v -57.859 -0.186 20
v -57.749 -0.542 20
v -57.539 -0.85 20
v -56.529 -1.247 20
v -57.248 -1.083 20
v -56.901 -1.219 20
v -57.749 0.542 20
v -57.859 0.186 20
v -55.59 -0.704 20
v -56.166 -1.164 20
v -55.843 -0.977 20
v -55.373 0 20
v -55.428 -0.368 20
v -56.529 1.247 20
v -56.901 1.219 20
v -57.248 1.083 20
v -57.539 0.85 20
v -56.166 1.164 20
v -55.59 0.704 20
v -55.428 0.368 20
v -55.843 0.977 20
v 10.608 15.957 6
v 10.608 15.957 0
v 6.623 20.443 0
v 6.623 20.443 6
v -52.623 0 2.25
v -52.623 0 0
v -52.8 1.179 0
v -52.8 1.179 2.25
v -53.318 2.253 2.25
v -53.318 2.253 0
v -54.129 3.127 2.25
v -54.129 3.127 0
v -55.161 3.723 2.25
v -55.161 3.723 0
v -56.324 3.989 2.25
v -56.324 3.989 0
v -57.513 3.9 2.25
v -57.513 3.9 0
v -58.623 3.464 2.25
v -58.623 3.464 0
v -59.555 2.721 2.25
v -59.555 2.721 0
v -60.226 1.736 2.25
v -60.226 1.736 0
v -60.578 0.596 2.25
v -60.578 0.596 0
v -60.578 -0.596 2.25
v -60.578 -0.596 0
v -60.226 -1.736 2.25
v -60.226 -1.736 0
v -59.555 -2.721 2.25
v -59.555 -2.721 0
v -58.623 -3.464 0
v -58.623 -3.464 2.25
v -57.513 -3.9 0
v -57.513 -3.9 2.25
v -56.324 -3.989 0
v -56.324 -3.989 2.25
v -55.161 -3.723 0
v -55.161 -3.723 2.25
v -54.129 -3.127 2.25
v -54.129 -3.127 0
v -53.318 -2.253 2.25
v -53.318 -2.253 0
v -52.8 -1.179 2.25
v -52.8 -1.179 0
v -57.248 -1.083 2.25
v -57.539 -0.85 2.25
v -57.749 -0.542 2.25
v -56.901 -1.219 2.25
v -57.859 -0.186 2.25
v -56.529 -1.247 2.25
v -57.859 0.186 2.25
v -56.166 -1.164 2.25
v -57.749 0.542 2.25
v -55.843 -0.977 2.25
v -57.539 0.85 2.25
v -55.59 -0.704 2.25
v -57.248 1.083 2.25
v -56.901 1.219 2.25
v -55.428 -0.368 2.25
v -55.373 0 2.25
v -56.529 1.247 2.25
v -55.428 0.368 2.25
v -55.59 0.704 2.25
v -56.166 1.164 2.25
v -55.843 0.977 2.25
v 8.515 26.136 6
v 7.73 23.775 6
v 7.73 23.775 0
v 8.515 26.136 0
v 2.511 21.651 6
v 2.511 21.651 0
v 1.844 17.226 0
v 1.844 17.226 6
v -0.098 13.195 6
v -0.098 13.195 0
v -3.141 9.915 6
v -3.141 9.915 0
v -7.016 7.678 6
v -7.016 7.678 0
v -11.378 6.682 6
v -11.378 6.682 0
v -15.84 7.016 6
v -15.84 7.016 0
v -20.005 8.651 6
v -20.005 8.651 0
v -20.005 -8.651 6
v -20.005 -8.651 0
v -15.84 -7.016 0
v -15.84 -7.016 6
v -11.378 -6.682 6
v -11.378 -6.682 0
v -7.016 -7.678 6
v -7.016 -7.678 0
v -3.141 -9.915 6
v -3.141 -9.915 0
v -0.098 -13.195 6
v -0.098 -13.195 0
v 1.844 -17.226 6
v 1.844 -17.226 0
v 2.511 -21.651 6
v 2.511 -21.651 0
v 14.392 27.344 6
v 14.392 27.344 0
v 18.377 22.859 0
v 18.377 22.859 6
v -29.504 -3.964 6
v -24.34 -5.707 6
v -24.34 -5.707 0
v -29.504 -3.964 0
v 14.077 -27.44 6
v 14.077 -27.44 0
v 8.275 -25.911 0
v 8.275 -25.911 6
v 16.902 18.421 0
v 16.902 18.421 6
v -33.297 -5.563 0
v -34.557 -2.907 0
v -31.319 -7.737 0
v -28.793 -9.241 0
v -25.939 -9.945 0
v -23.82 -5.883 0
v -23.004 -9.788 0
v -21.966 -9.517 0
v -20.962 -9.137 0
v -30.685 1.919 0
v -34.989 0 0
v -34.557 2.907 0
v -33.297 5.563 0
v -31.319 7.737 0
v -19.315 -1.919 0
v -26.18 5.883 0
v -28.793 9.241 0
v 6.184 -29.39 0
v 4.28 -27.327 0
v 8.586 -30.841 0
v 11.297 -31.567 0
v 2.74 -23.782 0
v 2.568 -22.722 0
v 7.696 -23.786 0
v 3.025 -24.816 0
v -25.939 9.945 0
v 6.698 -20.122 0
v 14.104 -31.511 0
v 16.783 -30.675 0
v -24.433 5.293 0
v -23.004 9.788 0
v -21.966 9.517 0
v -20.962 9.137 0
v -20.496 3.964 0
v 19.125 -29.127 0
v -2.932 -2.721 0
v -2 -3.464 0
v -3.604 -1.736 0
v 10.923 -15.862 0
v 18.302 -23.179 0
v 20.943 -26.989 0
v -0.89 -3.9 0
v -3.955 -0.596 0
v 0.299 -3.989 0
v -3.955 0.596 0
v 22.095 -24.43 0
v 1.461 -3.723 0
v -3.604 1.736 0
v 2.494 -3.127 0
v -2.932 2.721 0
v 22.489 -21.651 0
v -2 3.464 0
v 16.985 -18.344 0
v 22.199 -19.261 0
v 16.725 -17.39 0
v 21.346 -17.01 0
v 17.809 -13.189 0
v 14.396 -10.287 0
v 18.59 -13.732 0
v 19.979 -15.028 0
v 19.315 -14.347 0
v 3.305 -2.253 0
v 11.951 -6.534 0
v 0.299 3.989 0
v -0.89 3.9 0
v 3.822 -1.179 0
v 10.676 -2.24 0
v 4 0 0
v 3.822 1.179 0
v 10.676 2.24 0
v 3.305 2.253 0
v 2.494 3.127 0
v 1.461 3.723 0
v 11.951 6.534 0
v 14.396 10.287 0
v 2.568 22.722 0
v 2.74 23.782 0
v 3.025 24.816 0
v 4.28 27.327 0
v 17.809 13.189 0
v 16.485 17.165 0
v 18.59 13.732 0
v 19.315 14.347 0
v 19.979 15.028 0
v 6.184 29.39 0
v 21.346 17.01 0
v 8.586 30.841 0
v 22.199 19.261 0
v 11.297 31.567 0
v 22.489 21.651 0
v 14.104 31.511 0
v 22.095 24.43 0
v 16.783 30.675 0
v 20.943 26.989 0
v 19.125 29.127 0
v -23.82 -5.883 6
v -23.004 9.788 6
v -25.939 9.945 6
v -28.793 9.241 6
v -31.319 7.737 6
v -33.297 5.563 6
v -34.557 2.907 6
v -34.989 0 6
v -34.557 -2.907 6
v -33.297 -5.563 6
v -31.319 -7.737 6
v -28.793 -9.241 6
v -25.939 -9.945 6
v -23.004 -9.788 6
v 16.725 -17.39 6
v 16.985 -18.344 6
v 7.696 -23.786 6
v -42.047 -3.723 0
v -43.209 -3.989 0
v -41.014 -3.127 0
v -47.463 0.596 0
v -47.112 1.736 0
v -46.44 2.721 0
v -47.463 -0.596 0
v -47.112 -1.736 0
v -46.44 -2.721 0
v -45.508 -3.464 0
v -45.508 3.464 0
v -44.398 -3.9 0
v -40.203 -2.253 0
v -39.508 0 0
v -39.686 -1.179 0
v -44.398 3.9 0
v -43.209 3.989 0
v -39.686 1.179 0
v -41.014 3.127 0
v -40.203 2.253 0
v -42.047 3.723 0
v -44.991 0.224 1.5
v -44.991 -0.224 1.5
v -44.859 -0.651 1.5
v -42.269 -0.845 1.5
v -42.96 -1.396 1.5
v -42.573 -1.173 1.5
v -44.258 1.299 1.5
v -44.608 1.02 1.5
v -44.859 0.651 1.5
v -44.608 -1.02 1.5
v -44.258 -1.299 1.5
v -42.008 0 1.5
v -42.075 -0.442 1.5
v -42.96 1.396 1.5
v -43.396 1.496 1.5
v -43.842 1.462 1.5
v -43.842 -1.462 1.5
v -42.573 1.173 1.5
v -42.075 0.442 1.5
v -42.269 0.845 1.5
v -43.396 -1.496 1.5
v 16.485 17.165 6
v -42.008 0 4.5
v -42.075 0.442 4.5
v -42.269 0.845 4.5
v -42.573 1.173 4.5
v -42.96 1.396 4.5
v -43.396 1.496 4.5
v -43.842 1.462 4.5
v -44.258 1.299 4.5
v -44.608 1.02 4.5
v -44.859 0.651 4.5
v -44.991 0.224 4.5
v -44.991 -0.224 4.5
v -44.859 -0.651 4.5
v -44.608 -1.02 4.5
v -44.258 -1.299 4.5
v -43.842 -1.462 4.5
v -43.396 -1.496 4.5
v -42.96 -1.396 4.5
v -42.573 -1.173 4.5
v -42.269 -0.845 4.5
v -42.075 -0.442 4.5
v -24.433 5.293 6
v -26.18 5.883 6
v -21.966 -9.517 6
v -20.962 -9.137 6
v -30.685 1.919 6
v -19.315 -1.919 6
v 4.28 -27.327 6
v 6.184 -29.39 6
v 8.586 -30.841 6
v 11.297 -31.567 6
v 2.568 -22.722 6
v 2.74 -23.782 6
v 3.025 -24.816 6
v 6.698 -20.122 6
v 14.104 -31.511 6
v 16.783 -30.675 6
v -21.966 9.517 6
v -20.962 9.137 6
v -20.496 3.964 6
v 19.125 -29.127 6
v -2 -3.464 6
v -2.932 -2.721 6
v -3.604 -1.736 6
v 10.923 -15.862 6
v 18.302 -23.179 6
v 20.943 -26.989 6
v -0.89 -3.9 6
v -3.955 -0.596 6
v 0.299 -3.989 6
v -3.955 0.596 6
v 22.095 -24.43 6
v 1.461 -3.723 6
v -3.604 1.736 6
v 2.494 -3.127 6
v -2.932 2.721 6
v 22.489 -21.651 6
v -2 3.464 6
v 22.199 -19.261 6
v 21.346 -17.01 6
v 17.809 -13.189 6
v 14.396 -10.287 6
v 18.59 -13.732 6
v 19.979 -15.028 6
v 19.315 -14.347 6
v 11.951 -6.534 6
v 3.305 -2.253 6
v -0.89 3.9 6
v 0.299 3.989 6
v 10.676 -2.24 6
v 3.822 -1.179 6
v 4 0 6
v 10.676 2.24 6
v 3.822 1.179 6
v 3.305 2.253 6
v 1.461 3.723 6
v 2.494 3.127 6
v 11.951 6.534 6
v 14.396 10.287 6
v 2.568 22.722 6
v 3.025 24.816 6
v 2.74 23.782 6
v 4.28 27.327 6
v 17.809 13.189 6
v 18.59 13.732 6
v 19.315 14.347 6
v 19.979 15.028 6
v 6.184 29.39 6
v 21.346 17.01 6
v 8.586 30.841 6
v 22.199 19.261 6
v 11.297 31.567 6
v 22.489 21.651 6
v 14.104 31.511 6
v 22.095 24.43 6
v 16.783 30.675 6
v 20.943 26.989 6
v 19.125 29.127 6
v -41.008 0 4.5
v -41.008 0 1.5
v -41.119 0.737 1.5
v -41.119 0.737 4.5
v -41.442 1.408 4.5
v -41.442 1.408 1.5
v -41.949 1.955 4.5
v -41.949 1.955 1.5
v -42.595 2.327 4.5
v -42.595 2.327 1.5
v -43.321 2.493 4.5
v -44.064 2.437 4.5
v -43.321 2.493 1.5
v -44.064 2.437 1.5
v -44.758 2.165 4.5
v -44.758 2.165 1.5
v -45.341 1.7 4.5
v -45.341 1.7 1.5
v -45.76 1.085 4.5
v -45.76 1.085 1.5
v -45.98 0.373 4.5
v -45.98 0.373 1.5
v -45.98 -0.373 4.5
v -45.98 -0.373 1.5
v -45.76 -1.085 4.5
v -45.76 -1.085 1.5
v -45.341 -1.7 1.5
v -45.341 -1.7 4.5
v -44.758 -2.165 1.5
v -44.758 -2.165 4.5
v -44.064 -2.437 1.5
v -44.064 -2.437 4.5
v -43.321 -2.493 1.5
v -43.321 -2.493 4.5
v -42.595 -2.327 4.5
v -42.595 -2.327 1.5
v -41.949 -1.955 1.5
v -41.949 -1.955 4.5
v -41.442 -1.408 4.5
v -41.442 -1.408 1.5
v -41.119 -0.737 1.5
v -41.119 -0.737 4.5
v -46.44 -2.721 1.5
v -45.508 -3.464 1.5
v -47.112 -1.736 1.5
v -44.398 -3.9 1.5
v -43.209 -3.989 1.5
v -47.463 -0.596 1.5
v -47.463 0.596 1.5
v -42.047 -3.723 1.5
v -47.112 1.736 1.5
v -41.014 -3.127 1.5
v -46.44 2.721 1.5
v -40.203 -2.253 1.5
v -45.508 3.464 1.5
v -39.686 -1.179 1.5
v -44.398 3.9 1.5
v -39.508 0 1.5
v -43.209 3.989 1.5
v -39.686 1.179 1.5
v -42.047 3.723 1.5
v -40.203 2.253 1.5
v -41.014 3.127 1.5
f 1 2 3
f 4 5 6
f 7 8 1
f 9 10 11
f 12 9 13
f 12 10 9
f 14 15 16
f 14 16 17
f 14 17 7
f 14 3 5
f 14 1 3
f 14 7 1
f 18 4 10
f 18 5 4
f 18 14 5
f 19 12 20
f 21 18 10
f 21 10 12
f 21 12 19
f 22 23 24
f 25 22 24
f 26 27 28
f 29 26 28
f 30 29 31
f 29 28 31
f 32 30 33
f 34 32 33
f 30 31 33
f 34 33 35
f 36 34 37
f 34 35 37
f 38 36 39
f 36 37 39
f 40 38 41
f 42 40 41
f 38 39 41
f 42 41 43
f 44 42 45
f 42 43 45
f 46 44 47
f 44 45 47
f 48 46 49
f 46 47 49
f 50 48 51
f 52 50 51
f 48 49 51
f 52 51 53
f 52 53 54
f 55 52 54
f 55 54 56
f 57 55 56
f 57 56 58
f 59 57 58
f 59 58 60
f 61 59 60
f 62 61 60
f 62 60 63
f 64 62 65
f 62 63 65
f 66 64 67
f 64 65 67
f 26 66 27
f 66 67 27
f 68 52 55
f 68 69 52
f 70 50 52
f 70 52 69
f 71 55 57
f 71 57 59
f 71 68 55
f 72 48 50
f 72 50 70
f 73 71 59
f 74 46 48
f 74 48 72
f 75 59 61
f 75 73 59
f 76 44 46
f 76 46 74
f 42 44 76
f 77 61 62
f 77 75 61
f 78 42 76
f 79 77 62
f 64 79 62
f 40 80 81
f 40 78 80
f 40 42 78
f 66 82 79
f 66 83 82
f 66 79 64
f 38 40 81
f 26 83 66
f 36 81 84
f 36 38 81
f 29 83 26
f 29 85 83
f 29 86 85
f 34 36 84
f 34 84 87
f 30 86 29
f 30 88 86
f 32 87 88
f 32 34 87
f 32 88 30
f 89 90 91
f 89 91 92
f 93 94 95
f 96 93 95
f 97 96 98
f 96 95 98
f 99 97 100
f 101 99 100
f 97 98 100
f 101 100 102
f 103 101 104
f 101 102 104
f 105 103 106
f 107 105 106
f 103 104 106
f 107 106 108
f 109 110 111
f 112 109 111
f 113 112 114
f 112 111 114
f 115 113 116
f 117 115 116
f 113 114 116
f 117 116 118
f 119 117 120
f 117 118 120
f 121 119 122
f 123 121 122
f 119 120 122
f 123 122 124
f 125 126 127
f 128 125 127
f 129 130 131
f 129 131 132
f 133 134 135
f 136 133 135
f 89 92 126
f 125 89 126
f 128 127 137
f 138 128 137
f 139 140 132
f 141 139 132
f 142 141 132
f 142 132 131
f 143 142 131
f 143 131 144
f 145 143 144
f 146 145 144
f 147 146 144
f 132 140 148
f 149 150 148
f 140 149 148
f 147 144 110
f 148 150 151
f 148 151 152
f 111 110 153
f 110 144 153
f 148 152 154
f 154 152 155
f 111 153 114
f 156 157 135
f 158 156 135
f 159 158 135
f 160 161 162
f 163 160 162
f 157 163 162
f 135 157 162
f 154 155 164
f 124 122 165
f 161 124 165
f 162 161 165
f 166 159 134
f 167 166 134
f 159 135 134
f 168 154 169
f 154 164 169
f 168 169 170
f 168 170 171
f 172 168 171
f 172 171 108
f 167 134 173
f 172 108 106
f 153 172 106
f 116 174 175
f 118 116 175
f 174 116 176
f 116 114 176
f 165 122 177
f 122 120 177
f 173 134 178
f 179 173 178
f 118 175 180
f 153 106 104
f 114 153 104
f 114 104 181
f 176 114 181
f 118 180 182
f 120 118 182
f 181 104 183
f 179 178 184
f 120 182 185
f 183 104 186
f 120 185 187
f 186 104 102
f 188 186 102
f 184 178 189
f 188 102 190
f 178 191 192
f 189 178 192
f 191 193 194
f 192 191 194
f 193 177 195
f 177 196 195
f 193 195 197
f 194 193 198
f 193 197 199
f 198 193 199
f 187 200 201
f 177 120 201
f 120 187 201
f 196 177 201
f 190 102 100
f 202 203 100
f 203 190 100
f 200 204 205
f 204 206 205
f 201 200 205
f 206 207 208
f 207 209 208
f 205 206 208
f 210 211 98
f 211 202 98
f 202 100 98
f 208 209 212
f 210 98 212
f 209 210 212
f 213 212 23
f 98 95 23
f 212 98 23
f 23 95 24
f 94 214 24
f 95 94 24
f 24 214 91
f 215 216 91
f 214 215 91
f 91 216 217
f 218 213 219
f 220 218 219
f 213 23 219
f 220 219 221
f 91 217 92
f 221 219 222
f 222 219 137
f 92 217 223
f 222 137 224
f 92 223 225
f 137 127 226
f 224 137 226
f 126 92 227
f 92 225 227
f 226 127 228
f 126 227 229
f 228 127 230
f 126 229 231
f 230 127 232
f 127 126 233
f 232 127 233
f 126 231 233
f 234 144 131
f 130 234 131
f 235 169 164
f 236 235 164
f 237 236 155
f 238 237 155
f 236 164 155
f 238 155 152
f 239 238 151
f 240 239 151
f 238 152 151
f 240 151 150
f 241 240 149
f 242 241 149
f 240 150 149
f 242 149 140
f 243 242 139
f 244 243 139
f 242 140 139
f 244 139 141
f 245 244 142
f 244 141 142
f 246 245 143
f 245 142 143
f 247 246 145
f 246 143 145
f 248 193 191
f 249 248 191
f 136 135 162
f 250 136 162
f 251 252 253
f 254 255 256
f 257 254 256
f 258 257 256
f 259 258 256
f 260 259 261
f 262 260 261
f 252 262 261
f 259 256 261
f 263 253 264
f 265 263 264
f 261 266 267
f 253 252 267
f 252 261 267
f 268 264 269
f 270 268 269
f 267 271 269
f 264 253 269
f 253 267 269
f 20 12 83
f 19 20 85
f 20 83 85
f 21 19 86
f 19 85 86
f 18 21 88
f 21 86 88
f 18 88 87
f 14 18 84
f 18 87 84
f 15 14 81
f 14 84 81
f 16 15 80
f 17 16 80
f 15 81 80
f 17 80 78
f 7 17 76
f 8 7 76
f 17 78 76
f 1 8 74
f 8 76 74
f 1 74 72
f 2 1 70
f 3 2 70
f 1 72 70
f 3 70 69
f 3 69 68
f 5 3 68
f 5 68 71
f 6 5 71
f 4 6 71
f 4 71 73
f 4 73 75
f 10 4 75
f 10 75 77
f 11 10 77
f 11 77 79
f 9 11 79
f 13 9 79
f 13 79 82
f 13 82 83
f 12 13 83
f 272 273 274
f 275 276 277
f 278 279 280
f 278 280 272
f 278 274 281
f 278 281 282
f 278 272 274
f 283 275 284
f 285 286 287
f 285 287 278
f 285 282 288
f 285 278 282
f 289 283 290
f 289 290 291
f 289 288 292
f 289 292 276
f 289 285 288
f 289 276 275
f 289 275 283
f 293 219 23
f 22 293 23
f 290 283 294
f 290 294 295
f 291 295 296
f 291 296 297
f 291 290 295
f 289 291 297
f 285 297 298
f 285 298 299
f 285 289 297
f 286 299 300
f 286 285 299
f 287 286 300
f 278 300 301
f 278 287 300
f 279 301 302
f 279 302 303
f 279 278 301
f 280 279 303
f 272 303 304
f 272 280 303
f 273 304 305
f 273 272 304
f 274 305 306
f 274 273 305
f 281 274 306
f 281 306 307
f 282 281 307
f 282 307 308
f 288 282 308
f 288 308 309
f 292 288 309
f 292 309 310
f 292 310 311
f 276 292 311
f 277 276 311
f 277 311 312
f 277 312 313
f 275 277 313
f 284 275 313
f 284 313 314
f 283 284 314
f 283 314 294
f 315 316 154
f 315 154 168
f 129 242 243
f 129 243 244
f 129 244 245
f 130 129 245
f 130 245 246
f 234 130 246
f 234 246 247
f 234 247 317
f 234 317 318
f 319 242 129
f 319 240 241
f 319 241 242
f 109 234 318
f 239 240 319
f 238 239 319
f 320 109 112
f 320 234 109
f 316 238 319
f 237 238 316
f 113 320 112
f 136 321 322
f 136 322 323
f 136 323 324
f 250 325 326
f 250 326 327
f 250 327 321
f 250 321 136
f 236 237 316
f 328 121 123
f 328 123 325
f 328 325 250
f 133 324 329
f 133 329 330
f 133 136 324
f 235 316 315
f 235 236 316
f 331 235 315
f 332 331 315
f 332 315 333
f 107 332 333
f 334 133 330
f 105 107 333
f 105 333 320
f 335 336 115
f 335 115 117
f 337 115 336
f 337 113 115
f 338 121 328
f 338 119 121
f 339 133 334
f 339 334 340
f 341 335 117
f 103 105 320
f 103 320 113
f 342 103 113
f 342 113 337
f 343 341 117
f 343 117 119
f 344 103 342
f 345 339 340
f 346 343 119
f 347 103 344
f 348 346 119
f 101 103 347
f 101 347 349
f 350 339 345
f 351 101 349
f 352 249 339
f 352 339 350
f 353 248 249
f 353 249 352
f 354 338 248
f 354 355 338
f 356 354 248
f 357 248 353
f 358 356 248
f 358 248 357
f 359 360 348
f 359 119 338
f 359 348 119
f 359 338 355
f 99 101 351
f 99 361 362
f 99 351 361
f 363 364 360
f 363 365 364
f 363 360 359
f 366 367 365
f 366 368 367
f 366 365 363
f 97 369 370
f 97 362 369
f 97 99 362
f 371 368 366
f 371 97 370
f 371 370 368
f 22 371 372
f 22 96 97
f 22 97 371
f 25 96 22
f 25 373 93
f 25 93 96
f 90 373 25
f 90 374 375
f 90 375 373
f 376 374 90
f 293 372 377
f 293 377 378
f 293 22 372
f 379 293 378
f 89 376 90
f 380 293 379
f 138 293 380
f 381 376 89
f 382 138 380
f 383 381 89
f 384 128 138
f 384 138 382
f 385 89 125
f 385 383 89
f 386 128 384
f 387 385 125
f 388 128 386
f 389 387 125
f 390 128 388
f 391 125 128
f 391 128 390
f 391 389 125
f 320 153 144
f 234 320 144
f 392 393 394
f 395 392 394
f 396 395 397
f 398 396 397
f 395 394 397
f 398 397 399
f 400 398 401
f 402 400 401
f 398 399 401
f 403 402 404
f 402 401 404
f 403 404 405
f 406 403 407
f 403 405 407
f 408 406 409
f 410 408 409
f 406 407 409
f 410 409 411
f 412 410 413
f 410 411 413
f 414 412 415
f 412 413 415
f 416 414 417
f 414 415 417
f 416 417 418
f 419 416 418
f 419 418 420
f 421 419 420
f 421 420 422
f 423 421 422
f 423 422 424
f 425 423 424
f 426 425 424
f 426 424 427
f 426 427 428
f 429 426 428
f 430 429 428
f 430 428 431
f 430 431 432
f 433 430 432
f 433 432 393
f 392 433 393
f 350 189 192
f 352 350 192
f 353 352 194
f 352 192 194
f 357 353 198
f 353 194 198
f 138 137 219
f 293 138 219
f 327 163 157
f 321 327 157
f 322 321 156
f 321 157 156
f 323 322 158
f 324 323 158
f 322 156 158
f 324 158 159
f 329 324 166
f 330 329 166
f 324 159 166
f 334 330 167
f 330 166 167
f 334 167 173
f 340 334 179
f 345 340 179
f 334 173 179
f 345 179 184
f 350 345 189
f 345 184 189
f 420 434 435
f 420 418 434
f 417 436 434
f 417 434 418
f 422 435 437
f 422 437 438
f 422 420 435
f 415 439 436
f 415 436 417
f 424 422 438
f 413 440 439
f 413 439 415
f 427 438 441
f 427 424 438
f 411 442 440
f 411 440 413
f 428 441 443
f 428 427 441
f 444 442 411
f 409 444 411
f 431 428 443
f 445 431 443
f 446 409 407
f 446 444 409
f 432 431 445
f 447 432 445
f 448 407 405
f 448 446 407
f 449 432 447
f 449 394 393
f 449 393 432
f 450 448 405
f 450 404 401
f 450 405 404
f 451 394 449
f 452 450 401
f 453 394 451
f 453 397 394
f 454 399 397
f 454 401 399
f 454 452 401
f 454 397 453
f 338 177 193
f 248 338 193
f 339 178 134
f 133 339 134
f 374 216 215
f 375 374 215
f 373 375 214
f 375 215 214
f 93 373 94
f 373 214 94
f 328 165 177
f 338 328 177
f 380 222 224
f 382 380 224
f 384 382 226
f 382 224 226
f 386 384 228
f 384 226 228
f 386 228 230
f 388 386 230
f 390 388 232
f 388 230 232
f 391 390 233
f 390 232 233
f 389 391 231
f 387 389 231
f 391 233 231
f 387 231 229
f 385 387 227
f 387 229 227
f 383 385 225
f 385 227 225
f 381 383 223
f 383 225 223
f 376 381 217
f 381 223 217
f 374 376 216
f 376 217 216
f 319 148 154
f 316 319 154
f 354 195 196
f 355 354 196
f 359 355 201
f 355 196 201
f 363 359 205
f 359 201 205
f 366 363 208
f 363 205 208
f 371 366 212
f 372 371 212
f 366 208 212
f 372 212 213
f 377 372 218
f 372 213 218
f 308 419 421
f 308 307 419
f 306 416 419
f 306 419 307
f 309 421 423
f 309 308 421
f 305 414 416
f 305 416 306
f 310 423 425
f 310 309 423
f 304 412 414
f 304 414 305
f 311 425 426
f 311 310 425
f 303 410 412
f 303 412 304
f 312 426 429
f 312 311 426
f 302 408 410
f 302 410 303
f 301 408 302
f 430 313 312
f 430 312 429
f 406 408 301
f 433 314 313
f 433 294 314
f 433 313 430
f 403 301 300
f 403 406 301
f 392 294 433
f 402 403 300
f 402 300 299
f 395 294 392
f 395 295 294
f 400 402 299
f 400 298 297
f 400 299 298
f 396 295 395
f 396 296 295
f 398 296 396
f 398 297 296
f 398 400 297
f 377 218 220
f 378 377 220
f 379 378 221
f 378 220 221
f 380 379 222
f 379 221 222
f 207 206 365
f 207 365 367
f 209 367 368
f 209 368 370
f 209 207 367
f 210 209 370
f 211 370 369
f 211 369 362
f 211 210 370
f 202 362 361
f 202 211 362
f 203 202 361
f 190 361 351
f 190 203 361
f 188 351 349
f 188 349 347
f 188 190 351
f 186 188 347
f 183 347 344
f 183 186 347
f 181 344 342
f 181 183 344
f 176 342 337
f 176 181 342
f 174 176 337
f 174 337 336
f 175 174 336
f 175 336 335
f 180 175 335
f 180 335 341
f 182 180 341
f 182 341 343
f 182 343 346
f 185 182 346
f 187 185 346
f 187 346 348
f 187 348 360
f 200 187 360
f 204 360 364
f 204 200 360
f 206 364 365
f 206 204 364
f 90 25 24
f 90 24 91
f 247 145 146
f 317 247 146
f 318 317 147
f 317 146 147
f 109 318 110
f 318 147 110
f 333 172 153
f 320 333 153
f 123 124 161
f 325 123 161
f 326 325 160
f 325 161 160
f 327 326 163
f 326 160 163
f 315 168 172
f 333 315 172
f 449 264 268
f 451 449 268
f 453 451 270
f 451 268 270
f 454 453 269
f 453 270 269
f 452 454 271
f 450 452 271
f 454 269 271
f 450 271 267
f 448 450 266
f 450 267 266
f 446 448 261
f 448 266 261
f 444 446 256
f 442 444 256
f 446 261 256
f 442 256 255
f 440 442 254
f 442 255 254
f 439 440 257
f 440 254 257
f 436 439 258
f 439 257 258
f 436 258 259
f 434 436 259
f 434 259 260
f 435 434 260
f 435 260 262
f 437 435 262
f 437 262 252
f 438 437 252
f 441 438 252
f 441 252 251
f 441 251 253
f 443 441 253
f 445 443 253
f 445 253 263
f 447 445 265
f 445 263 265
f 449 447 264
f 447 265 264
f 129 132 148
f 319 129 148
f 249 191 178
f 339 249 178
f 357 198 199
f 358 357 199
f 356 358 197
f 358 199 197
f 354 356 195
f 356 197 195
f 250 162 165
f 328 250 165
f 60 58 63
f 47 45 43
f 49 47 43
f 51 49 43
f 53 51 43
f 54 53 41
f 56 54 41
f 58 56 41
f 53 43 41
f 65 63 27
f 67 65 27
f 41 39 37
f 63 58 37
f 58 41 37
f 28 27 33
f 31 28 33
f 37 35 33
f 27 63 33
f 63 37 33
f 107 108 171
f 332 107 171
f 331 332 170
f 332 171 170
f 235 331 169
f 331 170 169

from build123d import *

# Parameters (mm, degrees)
F0_R     = 4
F1_DEPTH = 6
F2_R     = 4
F2_R_2   = 1.25
F3_DEPTH = 2.25
F4_DEPTH = 20
F2_R_3   = 2.5
F5_DEPTH = 1.5
F2_R_4   = 1.5
F6_DEPTH = 4.5
F7_DEPTH = 1.5


with BuildPart() as f1:
    # F0 (on Top) → F1 (new body)
    with BuildSketch(Plane.XY):
        with BuildLine():
            ThreePointArc((17.8087764651, -13.1885621655), (10.5136609995, 1.55e-08), (17.8087764913, 13.1885621819))
            ThreePointArc((17.8087764913, 13.1885621819), (7.6648242348, 12.9093044674), (2.5105162388, 21.6506351062))
            ThreePointArc((2.5105162388, 21.6506351062), (-4.9947417775, 8.6511467674), (-20.0052579234, 8.6511465947))
            ThreePointArc((-20.0052579234, 8.6511465947), (-16.3488532355, 4.9947417826), (-15.0105162388, 0))
            ThreePointArc((-15.0105162388, 0), (-16.348853269, -4.9947418405), (-20.0052580393, -8.6511466616))
            ThreePointArc((-20.0052580393, -8.6511466616), (-4.9947418405, -8.651146731), (2.5105162388, -21.6506350946))
            ThreePointArc((2.5105162388, -21.6506350946), (7.6648242263, -12.9093044721), (17.8087764651, -13.1885621655))
        make_face()
        Circle(F0_R, mode=Mode.SUBTRACT)
        with BuildLine():
            ThreePointArc((-15.0105162388, 0), (-16.3488532355, 4.9947417826), (-20.0052579234, 8.6511465947))
            ThreePointArc((-20.0052579234, 8.6511465947), (-21.4588051121, 9.3407561033), (-23.0042042837, 9.7880838407))
            ThreePointArc((-23.0042042837, 9.7880838407), (-23.7195905897, 7.8981657526), (-24.28, 5.9566433501))
            ThreePointArc((-24.28, 5.9566433501), (-22.2041780271, 5.3088020773), (-20.4955977684, 3.9636297173))
            ThreePointArc((-20.4955977684, 3.9636297173), (-19.3863374973, 2.1182052085), (-19, 0))
            ThreePointArc((-19, 0), (-19.0793230601, -0.9724117304), (-19.3151948578, -1.9191119027))
            ThreePointArc((-19.3151948578, -1.9191119027), (-21.0363702827, -4.5044022316), (-23.8195970894, -5.8827416201))
            ThreePointArc((-23.8195970894, -5.8827416201), (-24.0490803546, -5.9241667623), (-24.28, -5.9566433501))
            ThreePointArc((-24.28, -5.9566433501), (-23.7195905897, -7.8981657526), (-23.0042042837, -9.7880838407))
            ThreePointArc((-23.0042042837, -9.7880838407), (-21.4588051747, -9.340756127), (-20.0052580393, -8.6511466616))
            ThreePointArc((-20.0052580393, -8.6511466616), (-16.348853269, -4.9947418405), (-15.0105162388, 0))
        make_face()
        with BuildLine():
            ThreePointArc((-24.28, 5.9566433501), (-23.7195905897, 7.8981657526), (-23.0042042837, 9.7880838407))
            ThreePointArc((-23.0042042837, 9.7880838407), (-34.9894837612, 0), (-23.0042042837, -9.7880838407))
            ThreePointArc((-23.0042042837, -9.7880838407), (-23.7195905897, -7.8981657526), (-24.28, -5.9566433501))
            ThreePointArc((-24.28, -5.9566433501), (-27.1385628113, -5.6059387352), (-29.5044022316, -3.9636297173))
            ThreePointArc((-29.5044022316, -3.9636297173), (-30.8827416201, -1.1804029106), (-30.6848051422, 1.9191119027))
            ThreePointArc((-30.6848051422, 1.9191119027), (-28.9636297173, 4.5044022316), (-26.1804029106, 5.8827416201))
            ThreePointArc((-26.1804029106, 5.8827416201), (-25.2331481856, 5.995468449), (-24.28, 5.9566433501))
        make_face()
        with BuildLine():
            Line((-30.6848051422, 1.9191119027), (-26.1804029106, 5.8827416201))
            ThreePointArc((-26.1804029106, 5.8827416201), (-28.9636297173, 4.5044022316), (-30.6848051422, 1.9191119027))
        make_face()
        with BuildLine():
            ThreePointArc((-30.6848051422, 1.9191119027), (-30.8827416201, -1.1804029106), (-29.5044022316, -3.9636297173))
            Line((-29.5044022316, -3.9636297173), (-30.6848051422, 1.9191119027))
        make_face()
        with BuildLine():
            ThreePointArc((-29.5044022316, -3.9636297173), (-27.1385628113, -5.6059387352), (-24.28, -5.9566433501))
            ThreePointArc((-24.28, -5.9566433501), (-24.3102516626, -5.8319519976), (-24.3398629699, -5.7071070259))
            Line((-24.3398629699, -5.7071070259), (-29.5044022316, -3.9636297173))
        make_face()
        with BuildLine():
            Line((-19.3151948578, -1.9191119027), (-23.8195970894, -5.8827416201))
            ThreePointArc((-23.8195970894, -5.8827416201), (-21.0363702827, -4.5044022316), (-19.3151948578, -1.9191119027))
        make_face()
        with BuildLine():
            ThreePointArc((-19, 0), (-19.3863374973, 2.1182052085), (-20.4955977684, 3.9636297173))
            Line((-20.4955977684, 3.9636297173), (-19.3151948578, -1.9191119027))
            ThreePointArc((-19.3151948578, -1.9191119027), (-19.0793230601, -0.9724117304), (-19, 0))
        make_face()
        with BuildLine():
            ThreePointArc((-20.4955977684, 3.9636297173), (-22.2041780271, 5.3088020773), (-24.28, 5.9566433501))
            ThreePointArc((-24.28, 5.9566433501), (-24.3588972483, 5.6253110889), (-24.4332732575, 5.2929347175))
            Line((-24.4332732575, 5.2929347175), (-20.4955977684, 3.9636297173))
        make_face()
        with BuildLine():
            ThreePointArc((22.4894837612, -21.6506350946), (21.8407561434, -18.1094403126), (19.9788314023, -15.0281833832))
            ThreePointArc((19.9788314023, -15.0281833832), (18.6998074799, -16.5926851418), (17.2986044624, -18.0487751288))
            ThreePointArc((17.2986044624, -18.0487751288), (18.19173202, -19.7521655498), (18.5, -21.6506350946))
            ThreePointArc((18.5, -21.6506350946), (18.4502853687, -22.4214165364), (18.301965323, -23.1794249399))
            ThreePointArc((18.301965323, -23.1794249399), (16.7602544389, -25.8755885992), (14.0770118184, -27.4396793788))
            ThreePointArc((14.0770118184, -27.4396793788), (10.9712101547, -27.4526004176), (8.2750464955, -25.9108895335))
            ThreePointArc((8.2750464955, -25.9108895335), (7.5359355918, -25.0208078722), (6.9813955376, -24.0054184789))
            ThreePointArc((6.9813955376, -24.0054184789), (5.0197831098, -24.4908508944), (3.0253728814, -24.8162672239))
            ThreePointArc((3.0253728814, -24.8162672239), (14.1036134307, -31.5105645964), (22.4894837612, -21.6506350946))
        make_face()
        with BuildLine():
            ThreePointArc((17.2986044624, -18.0487751288), (18.6998074799, -16.5926851418), (19.9788314023, -15.0281833832))
            ThreePointArc((19.9788314023, -15.0281833832), (18.9596269474, -14.0307265968), (17.8087764651, -13.1885621655))
            ThreePointArc((17.8087764651, -13.1885621655), (7.6648242263, -12.9093044721), (2.5105162388, -21.6506350946))
            ThreePointArc((2.5105162388, -21.6506350946), (2.6400704983, -23.2542485253), (3.0253728814, -24.8162672239))
            ThreePointArc((3.0253728814, -24.8162672239), (5.0197831098, -24.4908508944), (6.9813955376, -24.0054184789))
            ThreePointArc((6.9813955376, -24.0054184789), (6.5159077276, -22.0872581311), (6.698034677, -20.1218452493))
            ThreePointArc((6.698034677, -20.1218452493), (8.2397455611, -17.4256815901), (10.9229881816, -15.8615908104))
            ThreePointArc((10.9229881816, -15.8615908104), (14.0287898453, -15.8486697716), (16.7249535045, -17.3903806557))
            ThreePointArc((16.7249535045, -17.3903806557), (17.0237728078, -17.7091278216), (17.2986044624, -18.0487751288))
        make_face()
        with BuildLine():
            ThreePointArc((14.0770118184, -27.4396793788), (16.7602544389, -25.8755885992), (18.301965323, -23.1794249399))
            Line((18.301965323, -23.1794249399), (14.0770118184, -27.4396793788))
        make_face()
        with BuildLine():
            Line((14.0770118184, -27.4396793788), (8.2750464955, -25.9108895335))
            ThreePointArc((8.2750464955, -25.9108895335), (10.9712101547, -27.4526004176), (14.0770118184, -27.4396793788))
        make_face()
        with BuildLine():
            ThreePointArc((6.9813955376, -24.0054184789), (7.3396039705, -23.8983307693), (7.6961709032, -23.7858982052))
            Line((7.6961709032, -23.7858982052), (6.698034677, -20.1218452493))
            ThreePointArc((6.698034677, -20.1218452493), (6.5159077276, -22.0872581311), (6.9813955376, -24.0054184789))
        make_face()
        with BuildLine():
            Line((8.2750464955, -25.9108895335), (7.6961709032, -23.7858982052))
            ThreePointArc((7.6961709032, -23.7858982052), (7.3396039705, -23.8983307693), (6.9813955376, -24.0054184789))
            ThreePointArc((6.9813955376, -24.0054184789), (7.5359355918, -25.0208078722), (8.2750464955, -25.9108895335))
        make_face()
        with BuildLine():
            Line((6.698034677, -20.1218452493), (10.9229881816, -15.8615908104))
            ThreePointArc((10.9229881816, -15.8615908104), (8.2397455611, -17.4256815901), (6.698034677, -20.1218452493))
        make_face()
        with BuildLine():
            Line((10.9229881816, -15.8615908104), (16.7249535045, -17.3903806557))
            ThreePointArc((16.7249535045, -17.3903806557), (14.0287898453, -15.8486697716), (10.9229881816, -15.8615908104))
        make_face()
        with BuildLine():
            ThreePointArc((18.5, -21.6506350946), (18.19173202, -19.7521655498), (17.2986044624, -18.0487751288))
            ThreePointArc((17.2986044624, -18.0487751288), (17.1423543672, -18.1972439328), (16.984830058, -18.3443601115))
            Line((16.984830058, -18.3443601115), (18.301965323, -23.1794249399))
            ThreePointArc((18.301965323, -23.1794249399), (18.4502853687, -22.4214165364), (18.5, -21.6506350946))
        make_face()
        with BuildLine():
            ThreePointArc((16.984830058, -18.3443601115), (17.1423543672, -18.1972439328), (17.2986044624, -18.0487751288))
            ThreePointArc((17.2986044624, -18.0487751288), (17.0237728078, -17.7091278216), (16.7249535045, -17.3903806557))
            Line((16.7249535045, -17.3903806557), (16.984830058, -18.3443601115))
        make_face()
        with BuildLine():
            ThreePointArc((17.2986044624, 18.0487751288), (18.6998074799, 16.5926851418), (19.9788314023, 15.0281833832))
            ThreePointArc((19.9788314023, 15.0281833832), (21.8407561434, 18.1094403126), (22.4894837612, 21.6506350946))
            ThreePointArc((22.4894837612, 21.6506350946), (14.1036134307, 31.5105645964), (3.0253728814, 24.8162672239))
            ThreePointArc((3.0253728814, 24.8162672239), (5.0197831098, 24.4908508944), (6.9813955376, 24.0054184789))
            ThreePointArc((6.9813955376, 24.0054184789), (7.6303262217, 25.1558137338), (8.5152359236, 26.1363518997))
            ThreePointArc((8.5152359236, 26.1363518997), (11.2919514843, 27.5277618402), (14.3923626692, 27.3444004154))
            ThreePointArc((14.3923626692, 27.3444004154), (16.9857168051, 25.635399171), (18.3771267456, 22.8586836103))
            ThreePointArc((18.3771267456, 22.8586836103), (18.4692026467, 22.2577757399), (18.5, 21.6506350946))
            ThreePointArc((18.5, 21.6506350946), (18.19173202, 19.7521655498), (17.2986044624, 18.0487751288))
        make_face()
        with BuildLine():
            ThreePointArc((17.8087764913, 13.1885621819), (18.9596269591, 14.0307266068), (19.9788314023, 15.0281833832))
            ThreePointArc((19.9788314023, 15.0281833832), (18.6998074799, 16.5926851418), (17.2986044624, 18.0487751288))
            ThreePointArc((17.2986044624, 18.0487751288), (16.9138635514, 17.5864244025), (16.4847640764, 17.1649182895))
            ThreePointArc((16.4847640764, 17.1649182895), (13.7080485157, 15.773508349), (10.6076373308, 15.9568697738))
            ThreePointArc((10.6076373308, 15.9568697738), (8.0142831949, 17.6658710182), (6.6228732544, 20.4425865789))
            ThreePointArc((6.6228732544, 20.4425865789), (6.5301494802, 22.2513719518), (6.9813955376, 24.0054184789))
            ThreePointArc((6.9813955376, 24.0054184789), (5.0197831098, 24.4908508944), (3.0253728814, 24.8162672239))
            ThreePointArc((3.0253728814, 24.8162672239), (2.6400704992, 23.254248531), (2.5105162388, 21.6506351062))
            ThreePointArc((2.5105162388, 21.6506351062), (7.6648242348, 12.9093044674), (17.8087764913, 13.1885621819))
        make_face()
        with BuildLine():
            ThreePointArc((6.6228732544, 20.4425865789), (8.0142831949, 17.6658710182), (10.6076373308, 15.9568697738))
            Line((10.6076373308, 15.9568697738), (6.6228732544, 20.4425865789))
        make_face()
        with BuildLine():
            Line((6.6228732544, 20.4425865789), (7.7303605299, 23.7748086444))
            ThreePointArc((7.7303605299, 23.7748086444), (7.3567816925, 23.8930484269), (6.9813955376, 24.0054184789))
            ThreePointArc((6.9813955376, 24.0054184789), (6.5301494802, 22.2513719518), (6.6228732544, 20.4425865789))
        make_face()
        with BuildLine():
            ThreePointArc((6.9813955376, 24.0054184789), (7.3567816925, 23.8930484269), (7.7303605299, 23.7748086444))
            Line((7.7303605299, 23.7748086444), (8.5152359236, 26.1363518997))
            ThreePointArc((8.5152359236, 26.1363518997), (7.6303262217, 25.1558137338), (6.9813955376, 24.0054184789))
        make_face()
        with BuildLine():
            ThreePointArc((14.3923626692, 27.3444004154), (11.2919514843, 27.5277618402), (8.5152359236, 26.1363518997))
            Line((8.5152359236, 26.1363518997), (14.3923626692, 27.3444004154))
        make_face()
        with BuildLine():
            Line((14.3923626692, 27.3444004154), (18.3771267456, 22.8586836103))
            ThreePointArc((18.3771267456, 22.8586836103), (16.9857168051, 25.635399171), (14.3923626692, 27.3444004154))
        make_face()
        with BuildLine():
            ThreePointArc((16.9021025092, 18.4206115742), (17.1013641247, 18.2357710304), (17.2986044624, 18.0487751288))
            ThreePointArc((17.2986044624, 18.0487751288), (18.19173202, 19.7521655498), (18.5, 21.6506350946))
            ThreePointArc((18.5, 21.6506350946), (18.4692026467, 22.2577757399), (18.3771267456, 22.8586836103))
            Line((18.3771267456, 22.8586836103), (16.9021025092, 18.4206115742))
        make_face()
        with BuildLine():
            ThreePointArc((16.4847640764, 17.1649182895), (16.9138635514, 17.5864244025), (17.2986044624, 18.0487751288))
            ThreePointArc((17.2986044624, 18.0487751288), (17.1013641247, 18.2357710304), (16.9021025092, 18.4206115742))
            Line((16.9021025092, 18.4206115742), (16.4847640764, 17.1649182895))
        make_face()
        with BuildLine():
            ThreePointArc((10.6076373308, 15.9568697738), (13.7080485157, 15.773508349), (16.4847640764, 17.1649182895))
            Line((16.4847640764, 17.1649182895), (10.6076373308, 15.9568697738))
        make_face()
        with BuildLine():
            ThreePointArc((-24.4332732575, 5.2929347175), (-24.3588972483, 5.6253110889), (-24.28, 5.9566433501))
            ThreePointArc((-24.28, 5.9566433501), (-25.2331481856, 5.995468449), (-26.1804029106, 5.8827416201))
            Line((-26.1804029106, 5.8827416201), (-24.4332732575, 5.2929347175))
        make_face()
        with BuildLine():
            ThreePointArc((-24.3398629699, -5.7071070259), (-24.3102516626, -5.8319519976), (-24.28, -5.9566433501))
            ThreePointArc((-24.28, -5.9566433501), (-24.0490803546, -5.9241667623), (-23.8195970894, -5.8827416201))
            Line((-23.8195970894, -5.8827416201), (-24.3398629699, -5.7071070259))
        make_face()
    extrude(amount=F1_DEPTH)


with BuildPart() as f3:
    # F2 (on Top) → F3 (new body)
    with BuildSketch(Plane.XY):
        with Locations((-56.6225573421, 0)):
            Circle(F2_R)
        with Locations((-56.6225573421, 0)):
            Circle(F2_R_2, mode=Mode.SUBTRACT)
    extrude(amount=F3_DEPTH)

    # F2 (on Top) → F4 (join)
    with BuildSketch(Plane.XY):
        with Locations((-56.6225573421, 0)):
            Circle(F2_R_2)
    extrude(amount=F4_DEPTH)


with BuildPart() as f5:
    # F2 (on Top) → F5 (new body)
    with BuildSketch(Plane.XY):
        with Locations((-43.507963419, 0)):
            Circle(F2_R)
        with Locations((-43.507963419, 0)):
            Circle(F2_R_3, mode=Mode.SUBTRACT)
    extrude(amount=F5_DEPTH)

    # F2 (on Top) → F6 (join)
    with BuildSketch(Plane.XY):
        with Locations((-43.507963419, 0)):
            Circle(F2_R_3)
        with Locations((-43.507963419, 0)):
            Circle(F2_R_4, mode=Mode.SUBTRACT)
    extrude(amount=F6_DEPTH)

    # F2 (on Top) → F7 (join)
    with BuildSketch(Plane.XY):
        with Locations((-43.507963419, 0)):
            Circle(F2_R_4)
    extrude(amount=F7_DEPTH)


solid = Compound([f1.part, f3.part, f5.part])
